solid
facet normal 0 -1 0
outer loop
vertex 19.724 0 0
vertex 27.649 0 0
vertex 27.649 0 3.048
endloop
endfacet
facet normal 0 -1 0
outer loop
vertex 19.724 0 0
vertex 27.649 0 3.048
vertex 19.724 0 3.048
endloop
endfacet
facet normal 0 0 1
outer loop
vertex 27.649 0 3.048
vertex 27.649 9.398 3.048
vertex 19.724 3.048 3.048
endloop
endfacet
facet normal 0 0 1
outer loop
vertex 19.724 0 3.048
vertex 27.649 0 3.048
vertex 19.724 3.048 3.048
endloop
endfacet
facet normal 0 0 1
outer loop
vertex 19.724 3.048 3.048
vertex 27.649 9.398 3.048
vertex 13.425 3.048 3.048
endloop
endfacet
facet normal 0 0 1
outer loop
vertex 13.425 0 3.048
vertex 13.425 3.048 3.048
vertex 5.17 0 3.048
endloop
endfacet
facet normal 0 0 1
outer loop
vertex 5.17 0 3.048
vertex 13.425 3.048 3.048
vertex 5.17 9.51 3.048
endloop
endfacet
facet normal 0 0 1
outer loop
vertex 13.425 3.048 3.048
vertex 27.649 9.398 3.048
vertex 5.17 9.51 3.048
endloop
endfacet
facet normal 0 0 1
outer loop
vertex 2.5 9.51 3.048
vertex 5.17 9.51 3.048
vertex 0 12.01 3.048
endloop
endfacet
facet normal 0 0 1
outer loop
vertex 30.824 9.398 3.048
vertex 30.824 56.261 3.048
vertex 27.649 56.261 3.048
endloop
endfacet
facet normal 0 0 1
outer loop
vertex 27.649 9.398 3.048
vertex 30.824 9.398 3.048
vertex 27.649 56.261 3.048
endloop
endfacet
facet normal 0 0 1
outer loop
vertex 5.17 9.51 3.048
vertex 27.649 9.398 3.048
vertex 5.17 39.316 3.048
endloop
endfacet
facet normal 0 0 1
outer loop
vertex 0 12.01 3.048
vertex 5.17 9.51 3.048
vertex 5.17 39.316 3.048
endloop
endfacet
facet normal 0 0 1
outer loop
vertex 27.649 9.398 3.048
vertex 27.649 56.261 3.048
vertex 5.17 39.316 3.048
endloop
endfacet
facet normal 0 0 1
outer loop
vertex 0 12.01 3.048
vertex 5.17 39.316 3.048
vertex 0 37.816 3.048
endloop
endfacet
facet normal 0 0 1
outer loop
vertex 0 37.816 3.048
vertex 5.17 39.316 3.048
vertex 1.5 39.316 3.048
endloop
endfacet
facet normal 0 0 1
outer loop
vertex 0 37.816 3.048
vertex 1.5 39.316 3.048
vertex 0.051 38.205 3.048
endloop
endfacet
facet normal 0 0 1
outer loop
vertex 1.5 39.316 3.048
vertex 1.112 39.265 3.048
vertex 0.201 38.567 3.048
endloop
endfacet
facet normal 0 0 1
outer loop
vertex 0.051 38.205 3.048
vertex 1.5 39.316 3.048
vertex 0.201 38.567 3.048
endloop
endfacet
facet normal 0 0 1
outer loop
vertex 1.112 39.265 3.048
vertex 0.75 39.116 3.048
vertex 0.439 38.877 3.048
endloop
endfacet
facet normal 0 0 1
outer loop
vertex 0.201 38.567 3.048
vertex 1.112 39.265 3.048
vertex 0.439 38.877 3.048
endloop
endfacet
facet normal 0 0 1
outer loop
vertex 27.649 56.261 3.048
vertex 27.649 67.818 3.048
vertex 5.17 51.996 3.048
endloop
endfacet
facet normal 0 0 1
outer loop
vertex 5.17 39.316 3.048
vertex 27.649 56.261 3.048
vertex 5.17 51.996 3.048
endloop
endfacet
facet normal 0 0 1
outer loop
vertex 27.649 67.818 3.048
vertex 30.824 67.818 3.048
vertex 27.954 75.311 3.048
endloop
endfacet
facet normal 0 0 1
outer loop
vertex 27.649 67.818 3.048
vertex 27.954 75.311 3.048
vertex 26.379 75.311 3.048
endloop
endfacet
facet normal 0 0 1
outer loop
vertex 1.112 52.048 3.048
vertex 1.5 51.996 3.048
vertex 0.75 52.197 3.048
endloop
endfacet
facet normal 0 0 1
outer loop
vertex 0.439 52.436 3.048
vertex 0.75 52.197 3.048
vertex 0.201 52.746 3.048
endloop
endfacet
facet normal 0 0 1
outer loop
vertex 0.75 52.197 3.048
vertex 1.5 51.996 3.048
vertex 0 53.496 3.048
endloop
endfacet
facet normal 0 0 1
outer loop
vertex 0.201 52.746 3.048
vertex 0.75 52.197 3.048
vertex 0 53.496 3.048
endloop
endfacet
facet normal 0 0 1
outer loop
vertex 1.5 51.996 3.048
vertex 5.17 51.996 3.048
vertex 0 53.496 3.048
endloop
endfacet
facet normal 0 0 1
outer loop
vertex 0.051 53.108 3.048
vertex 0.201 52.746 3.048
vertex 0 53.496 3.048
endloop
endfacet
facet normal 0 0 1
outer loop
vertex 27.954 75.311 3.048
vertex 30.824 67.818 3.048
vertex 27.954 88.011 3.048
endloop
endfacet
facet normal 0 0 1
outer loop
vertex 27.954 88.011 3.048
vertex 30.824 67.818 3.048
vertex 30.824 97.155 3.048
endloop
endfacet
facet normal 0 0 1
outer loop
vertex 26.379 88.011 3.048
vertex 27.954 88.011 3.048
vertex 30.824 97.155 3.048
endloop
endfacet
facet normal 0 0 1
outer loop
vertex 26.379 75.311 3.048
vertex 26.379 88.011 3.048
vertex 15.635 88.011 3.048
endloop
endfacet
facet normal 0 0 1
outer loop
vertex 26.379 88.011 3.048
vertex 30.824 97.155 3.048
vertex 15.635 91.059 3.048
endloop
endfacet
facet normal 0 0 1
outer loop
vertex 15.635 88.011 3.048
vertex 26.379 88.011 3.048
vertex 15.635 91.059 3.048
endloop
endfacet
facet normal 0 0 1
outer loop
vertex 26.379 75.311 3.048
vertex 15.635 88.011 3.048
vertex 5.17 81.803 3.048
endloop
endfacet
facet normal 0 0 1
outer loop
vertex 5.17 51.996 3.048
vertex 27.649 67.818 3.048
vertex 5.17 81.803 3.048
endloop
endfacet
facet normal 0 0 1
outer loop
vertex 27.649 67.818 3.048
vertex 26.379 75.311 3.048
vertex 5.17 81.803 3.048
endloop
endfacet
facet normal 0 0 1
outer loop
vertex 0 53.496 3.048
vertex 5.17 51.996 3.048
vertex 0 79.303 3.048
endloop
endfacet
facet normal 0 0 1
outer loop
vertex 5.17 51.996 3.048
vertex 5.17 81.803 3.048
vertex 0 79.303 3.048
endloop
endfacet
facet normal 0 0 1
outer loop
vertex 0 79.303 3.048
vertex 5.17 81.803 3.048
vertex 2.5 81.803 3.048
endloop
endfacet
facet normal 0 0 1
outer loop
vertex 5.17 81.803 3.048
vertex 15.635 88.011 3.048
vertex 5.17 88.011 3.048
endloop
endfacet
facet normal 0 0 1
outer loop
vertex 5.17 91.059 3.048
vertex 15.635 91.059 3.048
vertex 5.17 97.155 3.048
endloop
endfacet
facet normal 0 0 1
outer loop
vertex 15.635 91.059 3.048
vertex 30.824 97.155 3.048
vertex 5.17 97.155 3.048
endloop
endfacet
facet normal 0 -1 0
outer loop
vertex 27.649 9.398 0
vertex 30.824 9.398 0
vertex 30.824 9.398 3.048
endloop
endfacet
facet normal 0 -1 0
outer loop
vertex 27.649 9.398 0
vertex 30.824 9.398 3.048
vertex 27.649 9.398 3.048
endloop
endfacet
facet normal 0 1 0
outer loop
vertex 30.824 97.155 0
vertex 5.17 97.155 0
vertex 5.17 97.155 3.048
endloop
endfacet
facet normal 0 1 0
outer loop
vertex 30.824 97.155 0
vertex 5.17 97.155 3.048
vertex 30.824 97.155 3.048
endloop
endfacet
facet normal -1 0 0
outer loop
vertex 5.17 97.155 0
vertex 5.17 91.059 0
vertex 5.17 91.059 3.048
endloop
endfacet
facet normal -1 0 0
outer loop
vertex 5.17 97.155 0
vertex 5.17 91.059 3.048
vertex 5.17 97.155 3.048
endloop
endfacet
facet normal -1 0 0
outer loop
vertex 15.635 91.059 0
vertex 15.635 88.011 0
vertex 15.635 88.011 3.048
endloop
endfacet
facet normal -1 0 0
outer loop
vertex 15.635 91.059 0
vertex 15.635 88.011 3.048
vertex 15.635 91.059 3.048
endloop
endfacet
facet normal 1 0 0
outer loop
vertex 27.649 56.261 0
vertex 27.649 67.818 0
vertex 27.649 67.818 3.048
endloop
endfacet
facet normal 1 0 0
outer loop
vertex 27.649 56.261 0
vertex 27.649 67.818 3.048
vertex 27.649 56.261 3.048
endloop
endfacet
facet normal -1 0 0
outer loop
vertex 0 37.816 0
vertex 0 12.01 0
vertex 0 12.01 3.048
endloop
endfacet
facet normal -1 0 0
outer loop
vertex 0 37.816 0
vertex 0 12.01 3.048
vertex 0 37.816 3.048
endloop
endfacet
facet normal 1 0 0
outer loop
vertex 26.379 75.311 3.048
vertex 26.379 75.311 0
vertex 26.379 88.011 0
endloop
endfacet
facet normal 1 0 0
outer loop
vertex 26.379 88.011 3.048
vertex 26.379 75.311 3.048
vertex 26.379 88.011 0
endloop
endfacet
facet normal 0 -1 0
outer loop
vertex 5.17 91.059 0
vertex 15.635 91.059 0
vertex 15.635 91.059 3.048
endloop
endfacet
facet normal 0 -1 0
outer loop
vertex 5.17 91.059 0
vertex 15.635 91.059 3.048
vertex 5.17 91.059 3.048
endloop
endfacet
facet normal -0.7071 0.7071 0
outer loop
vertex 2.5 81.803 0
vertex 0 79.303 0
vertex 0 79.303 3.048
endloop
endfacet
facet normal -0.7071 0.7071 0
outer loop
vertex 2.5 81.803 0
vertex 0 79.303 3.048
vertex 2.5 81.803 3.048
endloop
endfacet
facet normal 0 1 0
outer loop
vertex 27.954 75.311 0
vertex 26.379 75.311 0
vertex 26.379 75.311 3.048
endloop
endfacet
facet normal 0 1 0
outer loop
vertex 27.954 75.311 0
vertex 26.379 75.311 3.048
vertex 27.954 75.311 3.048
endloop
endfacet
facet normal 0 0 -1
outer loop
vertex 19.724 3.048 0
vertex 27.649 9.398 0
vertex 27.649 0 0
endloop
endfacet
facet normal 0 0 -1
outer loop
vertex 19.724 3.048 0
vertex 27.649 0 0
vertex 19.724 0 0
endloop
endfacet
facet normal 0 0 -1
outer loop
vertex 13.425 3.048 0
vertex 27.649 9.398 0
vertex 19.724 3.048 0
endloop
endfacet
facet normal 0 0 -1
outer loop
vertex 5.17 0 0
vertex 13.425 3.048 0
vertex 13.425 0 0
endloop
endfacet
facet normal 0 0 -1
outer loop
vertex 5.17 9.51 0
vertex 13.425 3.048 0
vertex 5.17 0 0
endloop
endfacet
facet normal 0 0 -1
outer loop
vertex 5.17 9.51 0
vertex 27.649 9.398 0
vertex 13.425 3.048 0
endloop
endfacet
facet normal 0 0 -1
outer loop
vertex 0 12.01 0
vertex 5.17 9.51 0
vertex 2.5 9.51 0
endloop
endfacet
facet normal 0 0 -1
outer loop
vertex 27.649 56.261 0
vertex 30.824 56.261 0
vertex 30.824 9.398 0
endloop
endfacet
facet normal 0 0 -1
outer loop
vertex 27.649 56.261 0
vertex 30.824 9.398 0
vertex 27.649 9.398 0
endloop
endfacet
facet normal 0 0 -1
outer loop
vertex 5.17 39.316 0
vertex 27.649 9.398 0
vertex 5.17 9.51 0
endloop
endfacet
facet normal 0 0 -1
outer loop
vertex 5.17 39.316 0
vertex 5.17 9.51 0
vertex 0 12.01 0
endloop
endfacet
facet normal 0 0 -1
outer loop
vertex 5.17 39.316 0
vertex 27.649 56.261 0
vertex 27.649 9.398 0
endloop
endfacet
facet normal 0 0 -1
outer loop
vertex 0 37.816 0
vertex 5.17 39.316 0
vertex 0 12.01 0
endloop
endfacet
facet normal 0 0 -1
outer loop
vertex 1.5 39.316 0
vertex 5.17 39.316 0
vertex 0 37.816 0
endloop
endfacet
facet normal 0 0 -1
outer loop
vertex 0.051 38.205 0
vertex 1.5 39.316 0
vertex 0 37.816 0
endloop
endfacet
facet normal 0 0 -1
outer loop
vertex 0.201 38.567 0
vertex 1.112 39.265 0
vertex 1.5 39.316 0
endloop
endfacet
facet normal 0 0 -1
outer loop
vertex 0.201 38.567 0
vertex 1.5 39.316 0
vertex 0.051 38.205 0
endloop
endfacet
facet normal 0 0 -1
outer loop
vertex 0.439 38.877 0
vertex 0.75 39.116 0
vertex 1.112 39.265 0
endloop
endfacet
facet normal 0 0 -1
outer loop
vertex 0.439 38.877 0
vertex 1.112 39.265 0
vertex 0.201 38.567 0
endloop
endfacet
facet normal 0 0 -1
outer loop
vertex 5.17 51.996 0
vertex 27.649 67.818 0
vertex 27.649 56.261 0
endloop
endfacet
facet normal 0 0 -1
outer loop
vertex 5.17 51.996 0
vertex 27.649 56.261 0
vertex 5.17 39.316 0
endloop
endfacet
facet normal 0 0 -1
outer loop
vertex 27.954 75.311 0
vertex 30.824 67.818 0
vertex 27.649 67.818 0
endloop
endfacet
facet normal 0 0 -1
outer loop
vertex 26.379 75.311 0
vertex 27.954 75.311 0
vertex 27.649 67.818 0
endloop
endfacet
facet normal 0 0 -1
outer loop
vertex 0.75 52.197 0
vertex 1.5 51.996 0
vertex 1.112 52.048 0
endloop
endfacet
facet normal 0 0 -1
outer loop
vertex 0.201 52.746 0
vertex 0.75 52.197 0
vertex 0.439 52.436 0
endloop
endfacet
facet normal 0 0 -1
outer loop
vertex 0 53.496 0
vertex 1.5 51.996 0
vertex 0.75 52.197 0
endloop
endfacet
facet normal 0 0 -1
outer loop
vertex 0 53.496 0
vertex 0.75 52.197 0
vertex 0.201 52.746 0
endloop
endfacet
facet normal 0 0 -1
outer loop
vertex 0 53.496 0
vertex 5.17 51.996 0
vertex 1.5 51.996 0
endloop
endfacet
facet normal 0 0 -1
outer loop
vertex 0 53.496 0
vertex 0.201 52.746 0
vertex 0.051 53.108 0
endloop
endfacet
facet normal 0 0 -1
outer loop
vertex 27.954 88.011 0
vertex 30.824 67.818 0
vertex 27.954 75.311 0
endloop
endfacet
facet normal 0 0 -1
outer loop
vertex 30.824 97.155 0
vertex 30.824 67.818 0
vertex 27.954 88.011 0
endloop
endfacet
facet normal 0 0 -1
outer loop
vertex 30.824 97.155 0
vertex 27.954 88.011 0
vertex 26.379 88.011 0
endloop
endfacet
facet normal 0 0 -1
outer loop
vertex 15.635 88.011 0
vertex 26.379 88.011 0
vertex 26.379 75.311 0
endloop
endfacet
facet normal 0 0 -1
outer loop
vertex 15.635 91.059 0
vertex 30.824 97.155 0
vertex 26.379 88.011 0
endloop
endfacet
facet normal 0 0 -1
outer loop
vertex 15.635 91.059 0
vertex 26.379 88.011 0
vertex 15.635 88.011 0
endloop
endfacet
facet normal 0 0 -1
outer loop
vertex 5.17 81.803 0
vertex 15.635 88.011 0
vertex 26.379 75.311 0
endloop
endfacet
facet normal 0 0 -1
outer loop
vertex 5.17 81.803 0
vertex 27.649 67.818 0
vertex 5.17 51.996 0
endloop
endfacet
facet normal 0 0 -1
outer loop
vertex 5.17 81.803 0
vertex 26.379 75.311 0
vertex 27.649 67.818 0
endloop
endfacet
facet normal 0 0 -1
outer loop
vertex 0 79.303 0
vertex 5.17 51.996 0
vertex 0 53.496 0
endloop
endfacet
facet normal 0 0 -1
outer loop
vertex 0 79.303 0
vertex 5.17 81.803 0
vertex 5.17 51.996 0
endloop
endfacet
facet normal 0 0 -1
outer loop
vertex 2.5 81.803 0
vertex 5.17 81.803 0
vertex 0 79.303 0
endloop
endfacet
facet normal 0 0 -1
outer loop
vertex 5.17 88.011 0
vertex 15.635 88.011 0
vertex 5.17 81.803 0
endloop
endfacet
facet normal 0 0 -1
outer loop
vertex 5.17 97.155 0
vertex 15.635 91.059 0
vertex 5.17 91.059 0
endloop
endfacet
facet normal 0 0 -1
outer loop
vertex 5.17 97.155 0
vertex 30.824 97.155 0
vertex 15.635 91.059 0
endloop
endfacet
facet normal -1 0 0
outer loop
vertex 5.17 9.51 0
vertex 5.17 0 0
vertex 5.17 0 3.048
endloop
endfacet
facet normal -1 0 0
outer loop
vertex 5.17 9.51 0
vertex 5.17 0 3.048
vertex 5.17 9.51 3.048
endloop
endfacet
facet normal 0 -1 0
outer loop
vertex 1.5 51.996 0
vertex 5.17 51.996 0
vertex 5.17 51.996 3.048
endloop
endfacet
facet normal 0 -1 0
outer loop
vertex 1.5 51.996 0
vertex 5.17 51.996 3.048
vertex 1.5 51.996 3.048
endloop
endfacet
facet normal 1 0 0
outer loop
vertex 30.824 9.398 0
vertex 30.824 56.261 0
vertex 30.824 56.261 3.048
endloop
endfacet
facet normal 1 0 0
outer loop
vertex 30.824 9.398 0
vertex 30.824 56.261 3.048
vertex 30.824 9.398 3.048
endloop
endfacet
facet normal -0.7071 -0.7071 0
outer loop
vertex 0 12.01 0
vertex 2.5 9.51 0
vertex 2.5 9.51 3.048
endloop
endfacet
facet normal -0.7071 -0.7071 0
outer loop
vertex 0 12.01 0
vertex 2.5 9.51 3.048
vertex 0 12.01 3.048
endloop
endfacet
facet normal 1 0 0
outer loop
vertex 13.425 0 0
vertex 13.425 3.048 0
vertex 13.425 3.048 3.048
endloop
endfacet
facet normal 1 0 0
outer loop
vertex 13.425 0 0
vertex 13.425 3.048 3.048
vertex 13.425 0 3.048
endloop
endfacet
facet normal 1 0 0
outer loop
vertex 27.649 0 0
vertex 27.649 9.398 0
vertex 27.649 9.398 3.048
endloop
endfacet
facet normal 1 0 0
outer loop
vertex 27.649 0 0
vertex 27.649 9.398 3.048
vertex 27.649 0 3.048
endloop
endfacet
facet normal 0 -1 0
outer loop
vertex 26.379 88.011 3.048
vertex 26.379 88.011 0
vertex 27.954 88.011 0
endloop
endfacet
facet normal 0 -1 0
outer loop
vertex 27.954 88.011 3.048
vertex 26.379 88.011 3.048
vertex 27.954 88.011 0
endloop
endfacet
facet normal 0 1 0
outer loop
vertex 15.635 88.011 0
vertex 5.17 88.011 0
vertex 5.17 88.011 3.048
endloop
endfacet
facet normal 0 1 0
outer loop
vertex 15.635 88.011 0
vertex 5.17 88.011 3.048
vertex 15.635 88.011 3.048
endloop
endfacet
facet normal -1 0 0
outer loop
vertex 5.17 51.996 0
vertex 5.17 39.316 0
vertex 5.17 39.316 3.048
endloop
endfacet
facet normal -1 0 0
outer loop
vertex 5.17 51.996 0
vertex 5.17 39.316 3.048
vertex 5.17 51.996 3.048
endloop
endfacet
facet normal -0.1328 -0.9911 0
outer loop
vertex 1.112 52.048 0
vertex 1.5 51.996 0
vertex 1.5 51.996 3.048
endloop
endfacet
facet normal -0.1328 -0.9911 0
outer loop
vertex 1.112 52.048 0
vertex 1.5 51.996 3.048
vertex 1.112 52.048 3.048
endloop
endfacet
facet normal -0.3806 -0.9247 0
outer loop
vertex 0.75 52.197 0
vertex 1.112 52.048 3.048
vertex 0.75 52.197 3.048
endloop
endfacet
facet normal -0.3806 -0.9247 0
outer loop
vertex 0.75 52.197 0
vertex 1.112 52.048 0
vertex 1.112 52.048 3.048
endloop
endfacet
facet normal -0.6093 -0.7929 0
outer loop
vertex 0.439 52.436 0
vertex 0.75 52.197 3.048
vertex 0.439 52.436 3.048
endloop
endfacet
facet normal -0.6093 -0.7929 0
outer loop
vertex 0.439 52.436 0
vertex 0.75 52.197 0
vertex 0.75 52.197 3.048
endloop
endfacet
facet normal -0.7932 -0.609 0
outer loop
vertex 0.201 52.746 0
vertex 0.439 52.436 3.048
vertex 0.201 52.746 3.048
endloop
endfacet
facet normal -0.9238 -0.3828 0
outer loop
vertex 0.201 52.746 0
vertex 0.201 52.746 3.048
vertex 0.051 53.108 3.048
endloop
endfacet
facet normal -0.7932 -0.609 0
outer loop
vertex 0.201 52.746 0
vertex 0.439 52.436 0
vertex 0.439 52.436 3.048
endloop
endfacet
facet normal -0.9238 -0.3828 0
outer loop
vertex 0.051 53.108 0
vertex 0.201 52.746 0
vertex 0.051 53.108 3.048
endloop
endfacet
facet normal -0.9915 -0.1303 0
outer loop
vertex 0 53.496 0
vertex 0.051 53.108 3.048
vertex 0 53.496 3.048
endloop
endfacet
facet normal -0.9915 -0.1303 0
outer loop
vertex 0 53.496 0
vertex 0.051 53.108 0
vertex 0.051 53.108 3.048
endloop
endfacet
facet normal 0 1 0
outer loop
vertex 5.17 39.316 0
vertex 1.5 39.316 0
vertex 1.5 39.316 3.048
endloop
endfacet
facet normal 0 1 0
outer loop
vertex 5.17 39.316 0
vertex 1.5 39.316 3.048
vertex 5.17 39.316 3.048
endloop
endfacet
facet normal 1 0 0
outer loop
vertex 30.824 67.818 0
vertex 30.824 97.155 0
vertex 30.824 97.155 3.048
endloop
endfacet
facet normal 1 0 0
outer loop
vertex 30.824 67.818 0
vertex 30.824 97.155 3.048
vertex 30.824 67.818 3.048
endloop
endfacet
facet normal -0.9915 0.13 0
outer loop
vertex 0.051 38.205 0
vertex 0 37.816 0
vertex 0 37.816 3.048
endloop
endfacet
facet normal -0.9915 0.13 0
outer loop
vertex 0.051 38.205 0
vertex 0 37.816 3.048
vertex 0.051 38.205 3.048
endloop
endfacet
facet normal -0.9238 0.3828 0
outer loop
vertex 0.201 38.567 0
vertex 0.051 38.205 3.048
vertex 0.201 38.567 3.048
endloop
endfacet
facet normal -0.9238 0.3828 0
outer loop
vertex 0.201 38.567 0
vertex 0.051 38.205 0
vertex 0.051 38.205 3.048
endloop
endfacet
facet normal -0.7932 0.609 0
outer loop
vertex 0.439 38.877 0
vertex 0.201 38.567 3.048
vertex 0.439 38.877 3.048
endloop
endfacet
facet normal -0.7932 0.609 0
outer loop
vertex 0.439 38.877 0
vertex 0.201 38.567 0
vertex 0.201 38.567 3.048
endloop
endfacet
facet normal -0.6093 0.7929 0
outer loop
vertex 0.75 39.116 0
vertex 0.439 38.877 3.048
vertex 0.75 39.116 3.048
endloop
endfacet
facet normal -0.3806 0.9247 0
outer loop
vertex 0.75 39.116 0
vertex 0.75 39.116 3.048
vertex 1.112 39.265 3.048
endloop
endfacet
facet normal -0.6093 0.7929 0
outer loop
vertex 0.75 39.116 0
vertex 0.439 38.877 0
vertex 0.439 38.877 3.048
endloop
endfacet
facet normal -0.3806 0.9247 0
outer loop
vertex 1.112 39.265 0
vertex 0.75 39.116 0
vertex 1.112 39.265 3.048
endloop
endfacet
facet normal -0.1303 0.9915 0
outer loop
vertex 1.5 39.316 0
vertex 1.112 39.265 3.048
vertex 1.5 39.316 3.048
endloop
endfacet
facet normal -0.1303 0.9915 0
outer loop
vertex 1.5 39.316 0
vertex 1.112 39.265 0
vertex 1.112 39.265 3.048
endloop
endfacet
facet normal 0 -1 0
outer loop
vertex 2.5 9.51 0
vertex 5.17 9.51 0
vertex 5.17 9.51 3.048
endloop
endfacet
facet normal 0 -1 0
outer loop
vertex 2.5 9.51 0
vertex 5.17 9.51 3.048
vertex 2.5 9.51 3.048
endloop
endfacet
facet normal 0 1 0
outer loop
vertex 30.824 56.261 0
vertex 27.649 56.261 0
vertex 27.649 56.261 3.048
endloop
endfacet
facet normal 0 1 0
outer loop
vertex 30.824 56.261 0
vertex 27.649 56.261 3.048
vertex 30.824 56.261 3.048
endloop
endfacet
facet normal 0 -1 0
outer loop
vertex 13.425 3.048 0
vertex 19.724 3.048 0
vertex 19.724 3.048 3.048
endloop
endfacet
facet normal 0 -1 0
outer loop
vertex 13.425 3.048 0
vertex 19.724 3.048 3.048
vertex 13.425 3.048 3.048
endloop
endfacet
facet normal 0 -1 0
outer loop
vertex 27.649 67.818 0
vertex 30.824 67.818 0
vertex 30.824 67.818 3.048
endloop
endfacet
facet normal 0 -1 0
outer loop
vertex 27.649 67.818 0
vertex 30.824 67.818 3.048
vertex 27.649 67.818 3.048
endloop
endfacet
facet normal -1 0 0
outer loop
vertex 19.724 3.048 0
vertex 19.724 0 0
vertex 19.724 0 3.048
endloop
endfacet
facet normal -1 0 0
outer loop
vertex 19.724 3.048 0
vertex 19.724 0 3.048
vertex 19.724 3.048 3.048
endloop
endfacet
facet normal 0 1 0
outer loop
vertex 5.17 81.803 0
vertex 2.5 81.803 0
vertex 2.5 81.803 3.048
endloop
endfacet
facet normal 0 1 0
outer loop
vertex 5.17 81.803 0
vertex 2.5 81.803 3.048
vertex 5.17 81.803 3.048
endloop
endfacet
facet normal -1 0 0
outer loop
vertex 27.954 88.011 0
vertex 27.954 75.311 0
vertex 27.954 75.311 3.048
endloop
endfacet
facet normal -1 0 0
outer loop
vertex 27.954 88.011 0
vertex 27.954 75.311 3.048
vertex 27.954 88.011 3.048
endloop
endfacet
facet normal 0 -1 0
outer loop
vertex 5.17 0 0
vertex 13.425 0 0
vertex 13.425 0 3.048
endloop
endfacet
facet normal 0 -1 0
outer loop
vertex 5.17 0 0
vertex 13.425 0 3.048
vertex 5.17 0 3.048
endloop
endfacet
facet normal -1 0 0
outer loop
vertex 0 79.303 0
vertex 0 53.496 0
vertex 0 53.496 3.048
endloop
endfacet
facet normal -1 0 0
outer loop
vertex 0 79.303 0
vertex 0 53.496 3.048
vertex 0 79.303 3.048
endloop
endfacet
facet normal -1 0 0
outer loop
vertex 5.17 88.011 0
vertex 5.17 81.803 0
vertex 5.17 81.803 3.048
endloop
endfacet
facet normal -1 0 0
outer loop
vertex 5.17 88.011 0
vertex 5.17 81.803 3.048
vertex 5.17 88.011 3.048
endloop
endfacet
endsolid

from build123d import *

# Parameters (mm, degrees)
MODEL_W             = 1.574799418
MODEL_H             = 12.699998915
BOSS_EXTRUDE1_DEPTH = 3.048


with BuildPart() as part:
    # Model → Boss-Extrude1 (new body)
    with BuildSketch(Plane.XY):
        with BuildLine():
            Line((15.63479994, 91.058996506), (5.17, 91.058996506))
            Line((5.17, 91.058996506), (5.17, 97.154987045))
            Line((5.17, 97.154987045), (30.823999648, 97.154987045))
            Line((30.823999648, 97.154987045), (30.823999648, 67.817998119))
            Line((30.823999648, 67.817998119), (27.648999919, 67.817998119))
            Line((27.648999919, 67.817998119), (27.648999919, 56.261000223))
            Line((27.648999919, 56.261000223), (30.823999648, 56.261000223))
            Line((30.823999648, 56.261000223), (30.823999648, 9.397999849))
            Line((30.823999648, 9.397999849), (27.648999919, 9.397999849))
            Line((27.648999919, 9.397999849), (27.648999919, 0))
            Line((27.648999919, 0), (19.724199181, 0))
            Line((19.724199181, 0), (19.724199181, 3.047999926))
            Line((19.724199181, 3.047999926), (13.424999644, 3.047999926))
            Line((13.424999644, 3.047999926), (13.424999644, 0))
            Line((13.424999644, 0), (5.17, 0))
            Line((5.17, 0), (5.17, 9.397999849))
            Line((5.17, 9.397999849), (5.17, 9.51))
            Line((5.17, 9.51), (2.5, 9.51))
            Line((2.5, 9.51), (0, 12.01))
            Line((0, 12.01), (0, 37.8165))
            ThreePointArc((0, 37.8165), (0.439339828, 38.877160172), (1.5, 39.3165))
            Line((1.5, 39.3165), (5.17, 39.3165))
            Line((5.17, 39.3165), (5.17, 51.9965))
            Line((5.17, 51.9965), (1.5, 51.9965))
            ThreePointArc((1.5, 51.9965), (0.439339828, 52.435839828), (0, 53.4965))
            Line((0, 53.4965), (0, 79.303))
            Line((0, 79.303), (2.5, 81.803))
            Line((2.5, 81.803), (5.17, 81.803))
            Line((5.17, 81.803), (5.17, 88.011001237))
            Line((5.17, 88.011001237), (15.63479994, 88.011001237))
            Line((15.63479994, 88.011001237), (15.63479994, 91.058996506))
        make_face()
        with Locations((27.166399737, 81.661001779)):
            Rectangle(MODEL_W, MODEL_H, mode=Mode.SUBTRACT)
    extrude(amount=BOSS_EXTRUDE1_DEPTH)


solid = part.part
